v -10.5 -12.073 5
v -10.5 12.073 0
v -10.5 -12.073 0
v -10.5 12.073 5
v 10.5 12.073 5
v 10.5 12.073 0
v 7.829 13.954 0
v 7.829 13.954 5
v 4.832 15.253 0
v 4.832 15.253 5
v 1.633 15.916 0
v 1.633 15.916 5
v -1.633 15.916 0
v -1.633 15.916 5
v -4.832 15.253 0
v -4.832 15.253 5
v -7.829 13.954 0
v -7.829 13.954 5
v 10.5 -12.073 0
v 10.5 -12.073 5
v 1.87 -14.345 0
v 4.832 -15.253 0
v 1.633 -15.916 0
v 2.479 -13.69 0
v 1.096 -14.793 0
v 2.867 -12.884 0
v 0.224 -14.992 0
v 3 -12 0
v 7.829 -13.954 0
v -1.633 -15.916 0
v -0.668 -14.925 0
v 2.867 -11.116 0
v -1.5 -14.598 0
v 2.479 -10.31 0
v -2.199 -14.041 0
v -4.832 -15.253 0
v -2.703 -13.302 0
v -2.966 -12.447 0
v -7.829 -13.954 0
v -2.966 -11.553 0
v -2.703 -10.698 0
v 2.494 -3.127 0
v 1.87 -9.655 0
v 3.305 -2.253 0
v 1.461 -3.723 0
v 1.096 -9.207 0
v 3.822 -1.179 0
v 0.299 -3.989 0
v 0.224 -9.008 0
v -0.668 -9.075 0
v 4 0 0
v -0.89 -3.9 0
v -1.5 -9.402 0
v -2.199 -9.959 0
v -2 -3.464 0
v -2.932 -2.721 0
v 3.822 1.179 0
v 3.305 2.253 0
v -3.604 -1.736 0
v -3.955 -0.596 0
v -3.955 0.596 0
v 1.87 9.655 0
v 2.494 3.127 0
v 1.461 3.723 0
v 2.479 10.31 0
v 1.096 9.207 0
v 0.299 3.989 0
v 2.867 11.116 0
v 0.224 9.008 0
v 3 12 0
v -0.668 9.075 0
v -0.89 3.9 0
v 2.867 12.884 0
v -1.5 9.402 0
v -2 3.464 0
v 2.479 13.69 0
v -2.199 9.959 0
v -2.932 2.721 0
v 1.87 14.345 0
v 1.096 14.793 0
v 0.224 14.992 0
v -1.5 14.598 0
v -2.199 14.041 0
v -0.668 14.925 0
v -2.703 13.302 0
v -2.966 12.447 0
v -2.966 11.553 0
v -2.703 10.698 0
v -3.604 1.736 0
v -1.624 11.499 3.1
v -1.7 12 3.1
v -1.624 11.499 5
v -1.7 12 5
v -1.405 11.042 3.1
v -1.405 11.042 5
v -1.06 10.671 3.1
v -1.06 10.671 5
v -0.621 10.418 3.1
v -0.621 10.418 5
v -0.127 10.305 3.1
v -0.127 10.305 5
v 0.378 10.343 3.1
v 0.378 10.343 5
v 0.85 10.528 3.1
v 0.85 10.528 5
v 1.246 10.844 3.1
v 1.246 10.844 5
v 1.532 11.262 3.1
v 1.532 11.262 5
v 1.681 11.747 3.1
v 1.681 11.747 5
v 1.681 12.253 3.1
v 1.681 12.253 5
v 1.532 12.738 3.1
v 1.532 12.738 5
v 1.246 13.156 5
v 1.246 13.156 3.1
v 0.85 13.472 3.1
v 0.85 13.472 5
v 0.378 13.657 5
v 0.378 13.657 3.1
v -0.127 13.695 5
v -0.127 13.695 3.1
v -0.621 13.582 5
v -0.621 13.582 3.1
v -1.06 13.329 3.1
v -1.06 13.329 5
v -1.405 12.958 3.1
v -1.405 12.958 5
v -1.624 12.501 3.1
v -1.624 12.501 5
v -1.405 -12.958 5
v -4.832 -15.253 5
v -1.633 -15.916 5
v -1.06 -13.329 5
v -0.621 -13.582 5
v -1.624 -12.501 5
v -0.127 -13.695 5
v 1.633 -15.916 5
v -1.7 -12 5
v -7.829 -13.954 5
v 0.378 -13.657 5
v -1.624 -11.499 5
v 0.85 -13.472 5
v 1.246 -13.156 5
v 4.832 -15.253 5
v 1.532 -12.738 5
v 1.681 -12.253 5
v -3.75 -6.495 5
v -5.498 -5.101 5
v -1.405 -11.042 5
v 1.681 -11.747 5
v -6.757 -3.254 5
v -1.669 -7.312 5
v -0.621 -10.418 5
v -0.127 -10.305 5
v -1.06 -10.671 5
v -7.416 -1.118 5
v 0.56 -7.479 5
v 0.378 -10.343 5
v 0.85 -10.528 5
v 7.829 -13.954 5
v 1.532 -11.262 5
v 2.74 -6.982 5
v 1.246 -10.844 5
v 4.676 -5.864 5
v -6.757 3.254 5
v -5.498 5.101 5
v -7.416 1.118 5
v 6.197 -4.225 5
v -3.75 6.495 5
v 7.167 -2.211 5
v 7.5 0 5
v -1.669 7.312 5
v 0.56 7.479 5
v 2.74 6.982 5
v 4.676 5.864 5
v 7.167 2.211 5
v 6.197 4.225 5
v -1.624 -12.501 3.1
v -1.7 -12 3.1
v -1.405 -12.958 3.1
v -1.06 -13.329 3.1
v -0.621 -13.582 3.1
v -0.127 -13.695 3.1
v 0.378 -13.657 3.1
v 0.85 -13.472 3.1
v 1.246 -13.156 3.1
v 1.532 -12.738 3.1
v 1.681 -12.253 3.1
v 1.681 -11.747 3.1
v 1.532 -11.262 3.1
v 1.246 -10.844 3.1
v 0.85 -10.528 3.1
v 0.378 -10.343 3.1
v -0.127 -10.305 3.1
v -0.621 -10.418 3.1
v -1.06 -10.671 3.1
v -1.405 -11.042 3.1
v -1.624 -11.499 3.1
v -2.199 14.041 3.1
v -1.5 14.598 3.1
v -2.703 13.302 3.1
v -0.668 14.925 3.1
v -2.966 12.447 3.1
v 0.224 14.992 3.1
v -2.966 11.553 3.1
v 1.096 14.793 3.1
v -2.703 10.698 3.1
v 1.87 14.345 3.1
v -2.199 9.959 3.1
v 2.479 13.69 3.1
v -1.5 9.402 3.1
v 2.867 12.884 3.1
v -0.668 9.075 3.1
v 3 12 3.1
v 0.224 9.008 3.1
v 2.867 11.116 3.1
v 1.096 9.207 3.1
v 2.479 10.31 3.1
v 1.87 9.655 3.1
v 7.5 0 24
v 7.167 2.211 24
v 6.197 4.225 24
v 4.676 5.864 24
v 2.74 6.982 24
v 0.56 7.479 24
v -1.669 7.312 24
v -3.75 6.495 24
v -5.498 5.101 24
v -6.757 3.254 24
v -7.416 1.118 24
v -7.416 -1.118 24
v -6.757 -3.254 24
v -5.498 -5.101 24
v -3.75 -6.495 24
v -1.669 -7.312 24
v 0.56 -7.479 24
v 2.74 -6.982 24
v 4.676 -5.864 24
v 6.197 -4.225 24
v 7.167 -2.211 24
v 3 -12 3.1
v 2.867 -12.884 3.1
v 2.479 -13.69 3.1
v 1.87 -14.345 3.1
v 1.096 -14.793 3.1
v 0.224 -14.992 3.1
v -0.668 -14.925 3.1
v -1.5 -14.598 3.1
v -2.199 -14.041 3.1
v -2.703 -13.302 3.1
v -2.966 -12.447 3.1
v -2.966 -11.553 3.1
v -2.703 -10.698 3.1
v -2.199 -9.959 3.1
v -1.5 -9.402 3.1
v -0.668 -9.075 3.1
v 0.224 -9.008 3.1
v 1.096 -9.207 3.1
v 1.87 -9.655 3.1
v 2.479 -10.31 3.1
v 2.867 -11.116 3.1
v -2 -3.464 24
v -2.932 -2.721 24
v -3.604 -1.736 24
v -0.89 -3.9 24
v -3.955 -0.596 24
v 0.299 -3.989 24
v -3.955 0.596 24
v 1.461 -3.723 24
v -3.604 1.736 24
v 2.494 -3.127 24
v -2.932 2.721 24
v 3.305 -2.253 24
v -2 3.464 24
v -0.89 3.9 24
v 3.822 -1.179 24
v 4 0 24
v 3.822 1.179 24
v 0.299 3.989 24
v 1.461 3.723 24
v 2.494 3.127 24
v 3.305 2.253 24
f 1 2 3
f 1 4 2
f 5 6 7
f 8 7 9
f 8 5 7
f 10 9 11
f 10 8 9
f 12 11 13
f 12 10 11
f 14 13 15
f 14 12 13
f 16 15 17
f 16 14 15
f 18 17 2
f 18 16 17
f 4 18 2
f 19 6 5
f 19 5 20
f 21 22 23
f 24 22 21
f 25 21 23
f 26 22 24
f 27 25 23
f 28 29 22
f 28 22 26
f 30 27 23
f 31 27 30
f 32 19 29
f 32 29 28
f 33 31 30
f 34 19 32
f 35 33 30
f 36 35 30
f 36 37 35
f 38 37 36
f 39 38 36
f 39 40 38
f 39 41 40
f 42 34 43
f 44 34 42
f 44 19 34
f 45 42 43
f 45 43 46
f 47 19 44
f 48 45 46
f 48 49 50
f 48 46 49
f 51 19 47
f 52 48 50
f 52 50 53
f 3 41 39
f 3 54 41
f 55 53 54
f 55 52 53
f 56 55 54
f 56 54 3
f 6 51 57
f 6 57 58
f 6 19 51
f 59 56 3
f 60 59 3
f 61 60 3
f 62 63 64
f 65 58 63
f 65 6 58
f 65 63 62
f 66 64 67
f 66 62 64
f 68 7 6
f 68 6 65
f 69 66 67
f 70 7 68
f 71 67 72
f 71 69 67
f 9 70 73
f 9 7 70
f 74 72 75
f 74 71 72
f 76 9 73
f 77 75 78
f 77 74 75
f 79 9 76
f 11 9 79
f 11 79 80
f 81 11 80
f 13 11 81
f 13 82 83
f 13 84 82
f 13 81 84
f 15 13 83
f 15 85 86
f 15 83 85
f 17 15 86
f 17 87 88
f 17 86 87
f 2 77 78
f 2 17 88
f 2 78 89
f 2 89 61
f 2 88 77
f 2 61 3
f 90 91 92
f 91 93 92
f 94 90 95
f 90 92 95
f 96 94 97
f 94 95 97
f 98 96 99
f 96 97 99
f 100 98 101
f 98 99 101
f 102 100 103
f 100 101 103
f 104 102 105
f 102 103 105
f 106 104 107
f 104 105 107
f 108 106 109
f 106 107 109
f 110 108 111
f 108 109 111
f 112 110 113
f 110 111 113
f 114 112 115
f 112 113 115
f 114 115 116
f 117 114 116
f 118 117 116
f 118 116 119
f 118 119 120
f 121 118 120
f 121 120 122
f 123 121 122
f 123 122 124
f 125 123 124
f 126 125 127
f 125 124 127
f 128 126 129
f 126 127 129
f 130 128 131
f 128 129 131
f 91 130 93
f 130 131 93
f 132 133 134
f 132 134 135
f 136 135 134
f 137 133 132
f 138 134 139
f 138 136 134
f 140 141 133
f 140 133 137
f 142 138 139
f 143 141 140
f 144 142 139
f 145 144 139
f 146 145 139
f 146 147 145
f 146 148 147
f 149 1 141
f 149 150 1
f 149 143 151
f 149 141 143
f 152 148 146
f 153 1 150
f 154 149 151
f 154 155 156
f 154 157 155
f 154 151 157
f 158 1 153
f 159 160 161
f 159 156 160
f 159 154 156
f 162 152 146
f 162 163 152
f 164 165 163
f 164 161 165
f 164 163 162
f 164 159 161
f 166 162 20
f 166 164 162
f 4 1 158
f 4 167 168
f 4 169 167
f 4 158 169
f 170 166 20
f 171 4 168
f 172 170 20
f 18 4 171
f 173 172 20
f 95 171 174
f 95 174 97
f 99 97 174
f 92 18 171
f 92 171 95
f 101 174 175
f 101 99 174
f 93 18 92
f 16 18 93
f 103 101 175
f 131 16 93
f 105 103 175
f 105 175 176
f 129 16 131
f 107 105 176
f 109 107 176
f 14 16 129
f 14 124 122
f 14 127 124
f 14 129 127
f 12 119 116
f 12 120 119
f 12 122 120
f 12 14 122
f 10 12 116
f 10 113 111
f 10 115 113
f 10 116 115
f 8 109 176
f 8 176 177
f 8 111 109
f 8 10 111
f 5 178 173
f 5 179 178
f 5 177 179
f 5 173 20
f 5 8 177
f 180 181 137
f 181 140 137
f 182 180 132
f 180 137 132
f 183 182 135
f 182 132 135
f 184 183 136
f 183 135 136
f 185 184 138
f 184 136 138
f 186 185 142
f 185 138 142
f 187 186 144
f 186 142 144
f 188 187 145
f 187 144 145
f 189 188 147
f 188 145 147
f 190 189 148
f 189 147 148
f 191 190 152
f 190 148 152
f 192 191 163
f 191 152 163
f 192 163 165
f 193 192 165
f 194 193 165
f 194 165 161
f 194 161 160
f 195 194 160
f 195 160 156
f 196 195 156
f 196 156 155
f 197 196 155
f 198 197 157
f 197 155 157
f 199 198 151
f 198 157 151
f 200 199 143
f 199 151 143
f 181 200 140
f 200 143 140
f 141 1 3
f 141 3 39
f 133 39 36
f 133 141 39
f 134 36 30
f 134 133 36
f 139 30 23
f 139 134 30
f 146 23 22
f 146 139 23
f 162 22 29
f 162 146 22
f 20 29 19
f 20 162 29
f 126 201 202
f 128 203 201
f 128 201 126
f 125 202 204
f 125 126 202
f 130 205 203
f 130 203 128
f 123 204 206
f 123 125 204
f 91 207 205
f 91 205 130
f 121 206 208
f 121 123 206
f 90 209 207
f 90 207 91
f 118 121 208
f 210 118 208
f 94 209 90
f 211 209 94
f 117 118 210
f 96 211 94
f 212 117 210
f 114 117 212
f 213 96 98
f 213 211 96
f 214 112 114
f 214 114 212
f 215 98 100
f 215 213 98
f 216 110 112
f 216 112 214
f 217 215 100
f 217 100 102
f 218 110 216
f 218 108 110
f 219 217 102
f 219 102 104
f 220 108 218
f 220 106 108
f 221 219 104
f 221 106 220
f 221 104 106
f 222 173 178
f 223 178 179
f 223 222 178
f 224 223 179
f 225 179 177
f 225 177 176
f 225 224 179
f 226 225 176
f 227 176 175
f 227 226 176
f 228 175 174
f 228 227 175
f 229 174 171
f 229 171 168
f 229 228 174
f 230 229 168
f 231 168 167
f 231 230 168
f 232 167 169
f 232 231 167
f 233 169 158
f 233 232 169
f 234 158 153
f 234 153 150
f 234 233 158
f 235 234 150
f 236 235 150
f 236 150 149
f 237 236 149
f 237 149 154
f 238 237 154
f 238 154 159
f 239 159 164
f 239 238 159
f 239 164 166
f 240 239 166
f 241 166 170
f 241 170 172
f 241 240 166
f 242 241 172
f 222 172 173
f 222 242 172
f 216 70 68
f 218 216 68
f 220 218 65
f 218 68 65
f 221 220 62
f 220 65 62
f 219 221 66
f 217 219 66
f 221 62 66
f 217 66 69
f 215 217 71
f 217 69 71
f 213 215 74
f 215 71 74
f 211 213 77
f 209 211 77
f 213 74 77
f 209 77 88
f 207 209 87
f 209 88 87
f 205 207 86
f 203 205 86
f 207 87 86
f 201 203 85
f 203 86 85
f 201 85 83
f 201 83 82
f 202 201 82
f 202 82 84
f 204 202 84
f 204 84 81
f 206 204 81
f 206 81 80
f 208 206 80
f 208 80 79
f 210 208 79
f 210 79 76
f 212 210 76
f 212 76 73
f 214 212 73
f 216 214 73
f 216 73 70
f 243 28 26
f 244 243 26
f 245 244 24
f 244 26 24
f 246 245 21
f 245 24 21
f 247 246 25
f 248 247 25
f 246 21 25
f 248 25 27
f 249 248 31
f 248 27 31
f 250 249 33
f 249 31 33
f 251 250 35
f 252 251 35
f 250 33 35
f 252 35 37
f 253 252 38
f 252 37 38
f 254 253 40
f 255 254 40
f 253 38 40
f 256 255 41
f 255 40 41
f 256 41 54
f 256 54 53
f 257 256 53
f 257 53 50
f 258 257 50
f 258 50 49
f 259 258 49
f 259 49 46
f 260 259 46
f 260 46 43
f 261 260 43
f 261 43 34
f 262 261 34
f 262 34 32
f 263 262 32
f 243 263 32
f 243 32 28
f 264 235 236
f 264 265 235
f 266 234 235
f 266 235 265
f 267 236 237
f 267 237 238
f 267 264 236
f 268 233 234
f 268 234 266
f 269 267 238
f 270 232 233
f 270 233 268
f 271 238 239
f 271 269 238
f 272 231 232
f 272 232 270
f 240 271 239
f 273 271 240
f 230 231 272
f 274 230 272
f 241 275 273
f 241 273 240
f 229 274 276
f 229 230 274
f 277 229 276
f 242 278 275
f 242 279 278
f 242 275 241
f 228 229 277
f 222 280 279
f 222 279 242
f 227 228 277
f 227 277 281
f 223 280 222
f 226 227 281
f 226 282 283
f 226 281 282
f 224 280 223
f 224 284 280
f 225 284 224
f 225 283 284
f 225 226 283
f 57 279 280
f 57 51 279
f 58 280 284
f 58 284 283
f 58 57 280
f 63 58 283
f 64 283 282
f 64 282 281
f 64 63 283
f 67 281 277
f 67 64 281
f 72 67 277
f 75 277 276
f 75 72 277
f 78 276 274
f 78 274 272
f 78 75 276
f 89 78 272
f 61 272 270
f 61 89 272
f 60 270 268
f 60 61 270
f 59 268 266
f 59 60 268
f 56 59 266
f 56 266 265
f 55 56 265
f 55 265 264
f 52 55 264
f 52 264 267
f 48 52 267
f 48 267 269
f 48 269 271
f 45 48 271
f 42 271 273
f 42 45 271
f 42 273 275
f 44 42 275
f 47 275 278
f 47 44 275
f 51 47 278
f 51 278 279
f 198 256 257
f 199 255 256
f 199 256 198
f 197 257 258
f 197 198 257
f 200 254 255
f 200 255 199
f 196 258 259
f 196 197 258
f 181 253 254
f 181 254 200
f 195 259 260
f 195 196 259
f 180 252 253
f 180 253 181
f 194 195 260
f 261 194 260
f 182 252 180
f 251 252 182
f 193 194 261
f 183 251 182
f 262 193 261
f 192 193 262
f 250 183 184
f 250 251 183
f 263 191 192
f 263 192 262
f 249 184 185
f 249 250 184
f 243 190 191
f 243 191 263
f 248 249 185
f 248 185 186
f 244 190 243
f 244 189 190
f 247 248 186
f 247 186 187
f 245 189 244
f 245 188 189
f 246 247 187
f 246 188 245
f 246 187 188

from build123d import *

# Parameters (mm, degrees)
POCKET_DEPTH      = 102.450988
POCKET_DEPTH_BACK = 126.450988
HOLE_D            = 3.4
HOLE_CBORE_D      = 6
HOLE_CBORE_DEPTH  = 3.1


with BuildPart() as part:
    # Sketch → Revolution (revolve)
    with BuildSketch(Plane.XZ):
        Polygon((16, 0), (16, 5), (7.5, 5), (7.5, 24), (4, 24), (4, 0), align=None)
    revolve(axis=Axis((0, 0, 0), (0, 0, 1)))

    # Sketch001 → Pocket (cut, two sides)
    with BuildSketch(Plane.XY) as pocket_sk:
        Polygon((10.5, 20), (50.5, 20), (50.5, -20), (10.5, -20), (10.5, 0), align=None)
    pocket = extrude(amount=-POCKET_DEPTH, mode=Mode.SUBTRACT) + extrude(pocket_sk.sketch, amount=POCKET_DEPTH_BACK, mode=Mode.SUBTRACT)

    # Mirrored: Pocket across Sketch001 V_Axis
    add(pocket.mirror(Plane(origin=(0, 0, 0), x_dir=(0, 0, 1), z_dir=(1, 0, 0))), mode=Mode.SUBTRACT)

    # Hole (through all)
    with Locations(Plane(origin=(0, 0, 0), x_dir=(1, 0, 0), z_dir=(0, 0, -1))):
        with Locations((0, -12), (0, 12)):
            CounterBoreHole(HOLE_D / 2, HOLE_CBORE_D / 2, HOLE_CBORE_DEPTH)


solid = part.part
